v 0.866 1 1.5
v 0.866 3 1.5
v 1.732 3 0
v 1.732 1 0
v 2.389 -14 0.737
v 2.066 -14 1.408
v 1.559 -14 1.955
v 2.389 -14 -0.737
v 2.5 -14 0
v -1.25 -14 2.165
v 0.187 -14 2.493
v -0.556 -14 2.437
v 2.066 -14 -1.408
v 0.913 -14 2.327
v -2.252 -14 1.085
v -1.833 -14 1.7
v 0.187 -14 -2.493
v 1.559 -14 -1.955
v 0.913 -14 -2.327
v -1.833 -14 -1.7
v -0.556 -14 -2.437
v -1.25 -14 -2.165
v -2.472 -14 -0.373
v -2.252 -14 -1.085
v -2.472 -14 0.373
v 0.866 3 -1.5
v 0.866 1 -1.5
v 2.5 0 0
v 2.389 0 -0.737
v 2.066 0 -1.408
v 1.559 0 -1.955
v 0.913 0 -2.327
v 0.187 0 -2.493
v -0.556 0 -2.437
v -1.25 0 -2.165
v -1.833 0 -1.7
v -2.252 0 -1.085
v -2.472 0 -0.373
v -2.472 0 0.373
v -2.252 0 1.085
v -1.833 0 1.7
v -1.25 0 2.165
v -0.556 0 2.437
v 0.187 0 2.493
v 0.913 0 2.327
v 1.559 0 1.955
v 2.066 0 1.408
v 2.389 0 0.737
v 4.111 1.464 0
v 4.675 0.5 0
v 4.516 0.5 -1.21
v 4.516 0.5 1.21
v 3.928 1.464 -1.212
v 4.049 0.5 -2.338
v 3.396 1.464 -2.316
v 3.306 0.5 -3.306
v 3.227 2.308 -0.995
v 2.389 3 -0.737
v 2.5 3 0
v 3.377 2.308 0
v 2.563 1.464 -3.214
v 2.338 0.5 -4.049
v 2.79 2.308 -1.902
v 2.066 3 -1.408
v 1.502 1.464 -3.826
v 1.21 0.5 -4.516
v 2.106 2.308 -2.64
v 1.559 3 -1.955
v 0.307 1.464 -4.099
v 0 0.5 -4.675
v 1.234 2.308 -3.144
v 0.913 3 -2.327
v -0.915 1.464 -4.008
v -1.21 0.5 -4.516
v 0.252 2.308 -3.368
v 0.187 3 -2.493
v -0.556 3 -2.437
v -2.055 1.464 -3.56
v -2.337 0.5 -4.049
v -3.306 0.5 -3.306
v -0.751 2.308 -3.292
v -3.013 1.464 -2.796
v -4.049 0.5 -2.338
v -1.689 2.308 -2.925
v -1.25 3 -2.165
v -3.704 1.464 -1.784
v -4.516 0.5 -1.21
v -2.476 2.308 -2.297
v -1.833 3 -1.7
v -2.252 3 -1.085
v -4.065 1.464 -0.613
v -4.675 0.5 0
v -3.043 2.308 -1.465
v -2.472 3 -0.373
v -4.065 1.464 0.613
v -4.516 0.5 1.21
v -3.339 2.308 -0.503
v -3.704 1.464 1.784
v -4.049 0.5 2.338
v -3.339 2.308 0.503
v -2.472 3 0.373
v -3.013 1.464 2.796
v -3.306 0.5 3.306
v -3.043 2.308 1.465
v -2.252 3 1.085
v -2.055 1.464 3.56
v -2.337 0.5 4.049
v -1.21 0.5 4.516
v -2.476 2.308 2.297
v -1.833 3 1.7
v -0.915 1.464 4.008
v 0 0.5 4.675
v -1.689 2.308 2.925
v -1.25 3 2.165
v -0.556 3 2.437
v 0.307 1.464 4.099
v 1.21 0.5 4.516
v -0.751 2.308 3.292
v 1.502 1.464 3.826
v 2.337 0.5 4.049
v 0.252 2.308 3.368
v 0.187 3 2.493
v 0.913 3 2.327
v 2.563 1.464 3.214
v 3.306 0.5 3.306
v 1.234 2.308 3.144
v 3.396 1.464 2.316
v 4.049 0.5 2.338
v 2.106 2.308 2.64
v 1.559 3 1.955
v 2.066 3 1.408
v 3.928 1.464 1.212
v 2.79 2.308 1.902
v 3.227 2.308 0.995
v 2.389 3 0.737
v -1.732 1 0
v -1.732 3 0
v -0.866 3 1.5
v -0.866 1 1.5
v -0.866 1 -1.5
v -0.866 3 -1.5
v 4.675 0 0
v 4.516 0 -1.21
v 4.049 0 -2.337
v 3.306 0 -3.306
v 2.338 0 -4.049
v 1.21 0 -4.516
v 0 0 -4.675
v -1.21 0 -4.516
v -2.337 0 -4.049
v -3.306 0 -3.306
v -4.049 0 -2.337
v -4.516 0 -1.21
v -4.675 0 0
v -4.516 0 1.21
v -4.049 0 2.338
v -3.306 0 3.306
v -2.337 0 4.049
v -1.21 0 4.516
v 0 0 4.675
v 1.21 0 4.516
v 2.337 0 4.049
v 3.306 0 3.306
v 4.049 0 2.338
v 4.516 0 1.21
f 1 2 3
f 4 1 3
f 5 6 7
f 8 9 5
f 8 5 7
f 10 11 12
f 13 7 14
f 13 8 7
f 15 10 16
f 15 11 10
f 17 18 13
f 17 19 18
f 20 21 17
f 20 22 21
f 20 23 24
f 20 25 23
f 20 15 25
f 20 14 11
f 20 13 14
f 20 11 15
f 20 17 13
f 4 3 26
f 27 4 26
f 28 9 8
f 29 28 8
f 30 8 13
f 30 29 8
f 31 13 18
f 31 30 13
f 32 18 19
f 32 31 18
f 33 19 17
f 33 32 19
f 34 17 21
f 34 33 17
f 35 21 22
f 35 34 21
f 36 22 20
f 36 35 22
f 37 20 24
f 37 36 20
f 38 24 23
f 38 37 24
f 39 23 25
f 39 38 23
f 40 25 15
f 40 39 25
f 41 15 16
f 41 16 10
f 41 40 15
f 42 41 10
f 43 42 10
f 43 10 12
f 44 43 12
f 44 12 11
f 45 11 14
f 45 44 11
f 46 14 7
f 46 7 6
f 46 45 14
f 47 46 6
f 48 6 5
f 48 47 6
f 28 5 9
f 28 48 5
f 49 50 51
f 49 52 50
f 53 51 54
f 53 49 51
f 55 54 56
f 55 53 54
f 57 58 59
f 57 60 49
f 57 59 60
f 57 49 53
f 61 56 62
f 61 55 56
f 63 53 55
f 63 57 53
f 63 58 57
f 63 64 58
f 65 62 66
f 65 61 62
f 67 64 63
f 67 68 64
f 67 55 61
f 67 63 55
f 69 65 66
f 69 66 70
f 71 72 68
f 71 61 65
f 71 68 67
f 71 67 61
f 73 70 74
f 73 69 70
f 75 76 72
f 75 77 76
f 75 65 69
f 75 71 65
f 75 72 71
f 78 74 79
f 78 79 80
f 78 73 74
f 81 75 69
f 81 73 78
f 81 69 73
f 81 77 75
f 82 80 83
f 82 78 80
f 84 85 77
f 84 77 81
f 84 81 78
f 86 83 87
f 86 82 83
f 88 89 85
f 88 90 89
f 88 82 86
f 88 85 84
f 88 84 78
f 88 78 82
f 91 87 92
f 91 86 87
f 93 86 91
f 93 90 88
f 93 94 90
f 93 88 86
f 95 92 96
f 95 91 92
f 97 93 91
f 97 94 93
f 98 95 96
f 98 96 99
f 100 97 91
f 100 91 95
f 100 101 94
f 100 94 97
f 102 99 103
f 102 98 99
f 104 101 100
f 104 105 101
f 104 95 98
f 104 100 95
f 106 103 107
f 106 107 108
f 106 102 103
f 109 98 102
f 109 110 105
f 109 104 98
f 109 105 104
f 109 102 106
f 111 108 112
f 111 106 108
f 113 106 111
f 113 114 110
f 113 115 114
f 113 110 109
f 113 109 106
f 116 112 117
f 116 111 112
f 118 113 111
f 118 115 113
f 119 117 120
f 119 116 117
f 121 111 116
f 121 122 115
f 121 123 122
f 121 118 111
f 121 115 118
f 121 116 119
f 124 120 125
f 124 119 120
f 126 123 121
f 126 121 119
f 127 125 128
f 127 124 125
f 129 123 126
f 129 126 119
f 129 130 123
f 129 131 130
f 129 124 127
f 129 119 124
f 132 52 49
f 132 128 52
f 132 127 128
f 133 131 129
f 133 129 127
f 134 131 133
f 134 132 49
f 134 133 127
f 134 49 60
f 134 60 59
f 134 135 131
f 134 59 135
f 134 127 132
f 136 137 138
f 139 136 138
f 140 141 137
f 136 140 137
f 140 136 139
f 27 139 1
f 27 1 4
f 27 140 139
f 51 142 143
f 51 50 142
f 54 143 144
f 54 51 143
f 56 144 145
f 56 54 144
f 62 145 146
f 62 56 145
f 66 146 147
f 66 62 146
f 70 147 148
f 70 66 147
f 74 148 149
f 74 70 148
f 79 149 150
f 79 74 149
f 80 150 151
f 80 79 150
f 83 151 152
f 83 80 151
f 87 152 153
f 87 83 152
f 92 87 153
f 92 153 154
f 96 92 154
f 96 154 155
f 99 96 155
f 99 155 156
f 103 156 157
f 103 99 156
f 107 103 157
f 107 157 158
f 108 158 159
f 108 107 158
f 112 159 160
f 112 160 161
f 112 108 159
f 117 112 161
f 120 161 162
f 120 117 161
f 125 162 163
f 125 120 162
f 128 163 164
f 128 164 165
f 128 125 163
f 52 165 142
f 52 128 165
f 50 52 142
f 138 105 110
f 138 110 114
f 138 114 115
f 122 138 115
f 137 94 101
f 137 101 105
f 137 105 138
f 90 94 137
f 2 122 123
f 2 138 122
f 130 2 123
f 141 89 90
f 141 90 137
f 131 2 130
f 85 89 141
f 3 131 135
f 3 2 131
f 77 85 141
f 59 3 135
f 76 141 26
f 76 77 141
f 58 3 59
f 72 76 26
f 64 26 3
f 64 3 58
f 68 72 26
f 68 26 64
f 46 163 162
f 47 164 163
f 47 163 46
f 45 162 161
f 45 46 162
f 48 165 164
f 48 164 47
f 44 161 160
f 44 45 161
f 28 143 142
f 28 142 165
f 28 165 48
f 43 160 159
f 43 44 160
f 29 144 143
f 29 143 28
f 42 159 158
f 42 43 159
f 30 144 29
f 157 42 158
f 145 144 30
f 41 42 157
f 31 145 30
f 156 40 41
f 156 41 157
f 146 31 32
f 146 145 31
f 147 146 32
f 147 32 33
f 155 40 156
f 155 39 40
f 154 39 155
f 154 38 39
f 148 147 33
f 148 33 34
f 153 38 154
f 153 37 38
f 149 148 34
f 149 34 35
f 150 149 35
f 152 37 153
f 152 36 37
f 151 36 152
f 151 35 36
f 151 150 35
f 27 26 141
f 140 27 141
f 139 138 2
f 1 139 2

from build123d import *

# Parameters (mm, degrees)
CUT_EXTRUDE1_DEPTH = 2


with BuildPart() as part:
    # Sketch1 → Revolve1 (revolve)
    with BuildSketch(Plane.XY):
        with BuildLine():
            Line((2.5, 0), (4.675, 0))
            Line((4.675, 0), (4.675, 0.5))
            ThreePointArc((4.675, 0.5), (3.763510598, 1.90312922), (2.5, 3))
            Line((2.5, 3), (0, 3))
            Line((0, 3), (0, -14))
            Line((0, -14), (2.5, -14))
            Line((2.5, -14), (2.5, 0))
        make_face()
    revolve(axis=Axis((0, -14, 0), (0, 1, 0)))

    # Sketch2 → Cut-Extrude1 (cut)
    with BuildSketch(Plane(origin=(0, 3, 0), x_dir=(1, 0, 0), z_dir=(0, 1, 0))):
        Polygon((0.866025404, 1.5), (-0.866025404, 1.5), (-1.732050808, 0), (-0.866025404, -1.5), (0.866025404, -1.5), (1.732050808, 0), align=None)
    extrude(amount=-CUT_EXTRUDE1_DEPTH, mode=Mode.SUBTRACT)


solid = part.part
